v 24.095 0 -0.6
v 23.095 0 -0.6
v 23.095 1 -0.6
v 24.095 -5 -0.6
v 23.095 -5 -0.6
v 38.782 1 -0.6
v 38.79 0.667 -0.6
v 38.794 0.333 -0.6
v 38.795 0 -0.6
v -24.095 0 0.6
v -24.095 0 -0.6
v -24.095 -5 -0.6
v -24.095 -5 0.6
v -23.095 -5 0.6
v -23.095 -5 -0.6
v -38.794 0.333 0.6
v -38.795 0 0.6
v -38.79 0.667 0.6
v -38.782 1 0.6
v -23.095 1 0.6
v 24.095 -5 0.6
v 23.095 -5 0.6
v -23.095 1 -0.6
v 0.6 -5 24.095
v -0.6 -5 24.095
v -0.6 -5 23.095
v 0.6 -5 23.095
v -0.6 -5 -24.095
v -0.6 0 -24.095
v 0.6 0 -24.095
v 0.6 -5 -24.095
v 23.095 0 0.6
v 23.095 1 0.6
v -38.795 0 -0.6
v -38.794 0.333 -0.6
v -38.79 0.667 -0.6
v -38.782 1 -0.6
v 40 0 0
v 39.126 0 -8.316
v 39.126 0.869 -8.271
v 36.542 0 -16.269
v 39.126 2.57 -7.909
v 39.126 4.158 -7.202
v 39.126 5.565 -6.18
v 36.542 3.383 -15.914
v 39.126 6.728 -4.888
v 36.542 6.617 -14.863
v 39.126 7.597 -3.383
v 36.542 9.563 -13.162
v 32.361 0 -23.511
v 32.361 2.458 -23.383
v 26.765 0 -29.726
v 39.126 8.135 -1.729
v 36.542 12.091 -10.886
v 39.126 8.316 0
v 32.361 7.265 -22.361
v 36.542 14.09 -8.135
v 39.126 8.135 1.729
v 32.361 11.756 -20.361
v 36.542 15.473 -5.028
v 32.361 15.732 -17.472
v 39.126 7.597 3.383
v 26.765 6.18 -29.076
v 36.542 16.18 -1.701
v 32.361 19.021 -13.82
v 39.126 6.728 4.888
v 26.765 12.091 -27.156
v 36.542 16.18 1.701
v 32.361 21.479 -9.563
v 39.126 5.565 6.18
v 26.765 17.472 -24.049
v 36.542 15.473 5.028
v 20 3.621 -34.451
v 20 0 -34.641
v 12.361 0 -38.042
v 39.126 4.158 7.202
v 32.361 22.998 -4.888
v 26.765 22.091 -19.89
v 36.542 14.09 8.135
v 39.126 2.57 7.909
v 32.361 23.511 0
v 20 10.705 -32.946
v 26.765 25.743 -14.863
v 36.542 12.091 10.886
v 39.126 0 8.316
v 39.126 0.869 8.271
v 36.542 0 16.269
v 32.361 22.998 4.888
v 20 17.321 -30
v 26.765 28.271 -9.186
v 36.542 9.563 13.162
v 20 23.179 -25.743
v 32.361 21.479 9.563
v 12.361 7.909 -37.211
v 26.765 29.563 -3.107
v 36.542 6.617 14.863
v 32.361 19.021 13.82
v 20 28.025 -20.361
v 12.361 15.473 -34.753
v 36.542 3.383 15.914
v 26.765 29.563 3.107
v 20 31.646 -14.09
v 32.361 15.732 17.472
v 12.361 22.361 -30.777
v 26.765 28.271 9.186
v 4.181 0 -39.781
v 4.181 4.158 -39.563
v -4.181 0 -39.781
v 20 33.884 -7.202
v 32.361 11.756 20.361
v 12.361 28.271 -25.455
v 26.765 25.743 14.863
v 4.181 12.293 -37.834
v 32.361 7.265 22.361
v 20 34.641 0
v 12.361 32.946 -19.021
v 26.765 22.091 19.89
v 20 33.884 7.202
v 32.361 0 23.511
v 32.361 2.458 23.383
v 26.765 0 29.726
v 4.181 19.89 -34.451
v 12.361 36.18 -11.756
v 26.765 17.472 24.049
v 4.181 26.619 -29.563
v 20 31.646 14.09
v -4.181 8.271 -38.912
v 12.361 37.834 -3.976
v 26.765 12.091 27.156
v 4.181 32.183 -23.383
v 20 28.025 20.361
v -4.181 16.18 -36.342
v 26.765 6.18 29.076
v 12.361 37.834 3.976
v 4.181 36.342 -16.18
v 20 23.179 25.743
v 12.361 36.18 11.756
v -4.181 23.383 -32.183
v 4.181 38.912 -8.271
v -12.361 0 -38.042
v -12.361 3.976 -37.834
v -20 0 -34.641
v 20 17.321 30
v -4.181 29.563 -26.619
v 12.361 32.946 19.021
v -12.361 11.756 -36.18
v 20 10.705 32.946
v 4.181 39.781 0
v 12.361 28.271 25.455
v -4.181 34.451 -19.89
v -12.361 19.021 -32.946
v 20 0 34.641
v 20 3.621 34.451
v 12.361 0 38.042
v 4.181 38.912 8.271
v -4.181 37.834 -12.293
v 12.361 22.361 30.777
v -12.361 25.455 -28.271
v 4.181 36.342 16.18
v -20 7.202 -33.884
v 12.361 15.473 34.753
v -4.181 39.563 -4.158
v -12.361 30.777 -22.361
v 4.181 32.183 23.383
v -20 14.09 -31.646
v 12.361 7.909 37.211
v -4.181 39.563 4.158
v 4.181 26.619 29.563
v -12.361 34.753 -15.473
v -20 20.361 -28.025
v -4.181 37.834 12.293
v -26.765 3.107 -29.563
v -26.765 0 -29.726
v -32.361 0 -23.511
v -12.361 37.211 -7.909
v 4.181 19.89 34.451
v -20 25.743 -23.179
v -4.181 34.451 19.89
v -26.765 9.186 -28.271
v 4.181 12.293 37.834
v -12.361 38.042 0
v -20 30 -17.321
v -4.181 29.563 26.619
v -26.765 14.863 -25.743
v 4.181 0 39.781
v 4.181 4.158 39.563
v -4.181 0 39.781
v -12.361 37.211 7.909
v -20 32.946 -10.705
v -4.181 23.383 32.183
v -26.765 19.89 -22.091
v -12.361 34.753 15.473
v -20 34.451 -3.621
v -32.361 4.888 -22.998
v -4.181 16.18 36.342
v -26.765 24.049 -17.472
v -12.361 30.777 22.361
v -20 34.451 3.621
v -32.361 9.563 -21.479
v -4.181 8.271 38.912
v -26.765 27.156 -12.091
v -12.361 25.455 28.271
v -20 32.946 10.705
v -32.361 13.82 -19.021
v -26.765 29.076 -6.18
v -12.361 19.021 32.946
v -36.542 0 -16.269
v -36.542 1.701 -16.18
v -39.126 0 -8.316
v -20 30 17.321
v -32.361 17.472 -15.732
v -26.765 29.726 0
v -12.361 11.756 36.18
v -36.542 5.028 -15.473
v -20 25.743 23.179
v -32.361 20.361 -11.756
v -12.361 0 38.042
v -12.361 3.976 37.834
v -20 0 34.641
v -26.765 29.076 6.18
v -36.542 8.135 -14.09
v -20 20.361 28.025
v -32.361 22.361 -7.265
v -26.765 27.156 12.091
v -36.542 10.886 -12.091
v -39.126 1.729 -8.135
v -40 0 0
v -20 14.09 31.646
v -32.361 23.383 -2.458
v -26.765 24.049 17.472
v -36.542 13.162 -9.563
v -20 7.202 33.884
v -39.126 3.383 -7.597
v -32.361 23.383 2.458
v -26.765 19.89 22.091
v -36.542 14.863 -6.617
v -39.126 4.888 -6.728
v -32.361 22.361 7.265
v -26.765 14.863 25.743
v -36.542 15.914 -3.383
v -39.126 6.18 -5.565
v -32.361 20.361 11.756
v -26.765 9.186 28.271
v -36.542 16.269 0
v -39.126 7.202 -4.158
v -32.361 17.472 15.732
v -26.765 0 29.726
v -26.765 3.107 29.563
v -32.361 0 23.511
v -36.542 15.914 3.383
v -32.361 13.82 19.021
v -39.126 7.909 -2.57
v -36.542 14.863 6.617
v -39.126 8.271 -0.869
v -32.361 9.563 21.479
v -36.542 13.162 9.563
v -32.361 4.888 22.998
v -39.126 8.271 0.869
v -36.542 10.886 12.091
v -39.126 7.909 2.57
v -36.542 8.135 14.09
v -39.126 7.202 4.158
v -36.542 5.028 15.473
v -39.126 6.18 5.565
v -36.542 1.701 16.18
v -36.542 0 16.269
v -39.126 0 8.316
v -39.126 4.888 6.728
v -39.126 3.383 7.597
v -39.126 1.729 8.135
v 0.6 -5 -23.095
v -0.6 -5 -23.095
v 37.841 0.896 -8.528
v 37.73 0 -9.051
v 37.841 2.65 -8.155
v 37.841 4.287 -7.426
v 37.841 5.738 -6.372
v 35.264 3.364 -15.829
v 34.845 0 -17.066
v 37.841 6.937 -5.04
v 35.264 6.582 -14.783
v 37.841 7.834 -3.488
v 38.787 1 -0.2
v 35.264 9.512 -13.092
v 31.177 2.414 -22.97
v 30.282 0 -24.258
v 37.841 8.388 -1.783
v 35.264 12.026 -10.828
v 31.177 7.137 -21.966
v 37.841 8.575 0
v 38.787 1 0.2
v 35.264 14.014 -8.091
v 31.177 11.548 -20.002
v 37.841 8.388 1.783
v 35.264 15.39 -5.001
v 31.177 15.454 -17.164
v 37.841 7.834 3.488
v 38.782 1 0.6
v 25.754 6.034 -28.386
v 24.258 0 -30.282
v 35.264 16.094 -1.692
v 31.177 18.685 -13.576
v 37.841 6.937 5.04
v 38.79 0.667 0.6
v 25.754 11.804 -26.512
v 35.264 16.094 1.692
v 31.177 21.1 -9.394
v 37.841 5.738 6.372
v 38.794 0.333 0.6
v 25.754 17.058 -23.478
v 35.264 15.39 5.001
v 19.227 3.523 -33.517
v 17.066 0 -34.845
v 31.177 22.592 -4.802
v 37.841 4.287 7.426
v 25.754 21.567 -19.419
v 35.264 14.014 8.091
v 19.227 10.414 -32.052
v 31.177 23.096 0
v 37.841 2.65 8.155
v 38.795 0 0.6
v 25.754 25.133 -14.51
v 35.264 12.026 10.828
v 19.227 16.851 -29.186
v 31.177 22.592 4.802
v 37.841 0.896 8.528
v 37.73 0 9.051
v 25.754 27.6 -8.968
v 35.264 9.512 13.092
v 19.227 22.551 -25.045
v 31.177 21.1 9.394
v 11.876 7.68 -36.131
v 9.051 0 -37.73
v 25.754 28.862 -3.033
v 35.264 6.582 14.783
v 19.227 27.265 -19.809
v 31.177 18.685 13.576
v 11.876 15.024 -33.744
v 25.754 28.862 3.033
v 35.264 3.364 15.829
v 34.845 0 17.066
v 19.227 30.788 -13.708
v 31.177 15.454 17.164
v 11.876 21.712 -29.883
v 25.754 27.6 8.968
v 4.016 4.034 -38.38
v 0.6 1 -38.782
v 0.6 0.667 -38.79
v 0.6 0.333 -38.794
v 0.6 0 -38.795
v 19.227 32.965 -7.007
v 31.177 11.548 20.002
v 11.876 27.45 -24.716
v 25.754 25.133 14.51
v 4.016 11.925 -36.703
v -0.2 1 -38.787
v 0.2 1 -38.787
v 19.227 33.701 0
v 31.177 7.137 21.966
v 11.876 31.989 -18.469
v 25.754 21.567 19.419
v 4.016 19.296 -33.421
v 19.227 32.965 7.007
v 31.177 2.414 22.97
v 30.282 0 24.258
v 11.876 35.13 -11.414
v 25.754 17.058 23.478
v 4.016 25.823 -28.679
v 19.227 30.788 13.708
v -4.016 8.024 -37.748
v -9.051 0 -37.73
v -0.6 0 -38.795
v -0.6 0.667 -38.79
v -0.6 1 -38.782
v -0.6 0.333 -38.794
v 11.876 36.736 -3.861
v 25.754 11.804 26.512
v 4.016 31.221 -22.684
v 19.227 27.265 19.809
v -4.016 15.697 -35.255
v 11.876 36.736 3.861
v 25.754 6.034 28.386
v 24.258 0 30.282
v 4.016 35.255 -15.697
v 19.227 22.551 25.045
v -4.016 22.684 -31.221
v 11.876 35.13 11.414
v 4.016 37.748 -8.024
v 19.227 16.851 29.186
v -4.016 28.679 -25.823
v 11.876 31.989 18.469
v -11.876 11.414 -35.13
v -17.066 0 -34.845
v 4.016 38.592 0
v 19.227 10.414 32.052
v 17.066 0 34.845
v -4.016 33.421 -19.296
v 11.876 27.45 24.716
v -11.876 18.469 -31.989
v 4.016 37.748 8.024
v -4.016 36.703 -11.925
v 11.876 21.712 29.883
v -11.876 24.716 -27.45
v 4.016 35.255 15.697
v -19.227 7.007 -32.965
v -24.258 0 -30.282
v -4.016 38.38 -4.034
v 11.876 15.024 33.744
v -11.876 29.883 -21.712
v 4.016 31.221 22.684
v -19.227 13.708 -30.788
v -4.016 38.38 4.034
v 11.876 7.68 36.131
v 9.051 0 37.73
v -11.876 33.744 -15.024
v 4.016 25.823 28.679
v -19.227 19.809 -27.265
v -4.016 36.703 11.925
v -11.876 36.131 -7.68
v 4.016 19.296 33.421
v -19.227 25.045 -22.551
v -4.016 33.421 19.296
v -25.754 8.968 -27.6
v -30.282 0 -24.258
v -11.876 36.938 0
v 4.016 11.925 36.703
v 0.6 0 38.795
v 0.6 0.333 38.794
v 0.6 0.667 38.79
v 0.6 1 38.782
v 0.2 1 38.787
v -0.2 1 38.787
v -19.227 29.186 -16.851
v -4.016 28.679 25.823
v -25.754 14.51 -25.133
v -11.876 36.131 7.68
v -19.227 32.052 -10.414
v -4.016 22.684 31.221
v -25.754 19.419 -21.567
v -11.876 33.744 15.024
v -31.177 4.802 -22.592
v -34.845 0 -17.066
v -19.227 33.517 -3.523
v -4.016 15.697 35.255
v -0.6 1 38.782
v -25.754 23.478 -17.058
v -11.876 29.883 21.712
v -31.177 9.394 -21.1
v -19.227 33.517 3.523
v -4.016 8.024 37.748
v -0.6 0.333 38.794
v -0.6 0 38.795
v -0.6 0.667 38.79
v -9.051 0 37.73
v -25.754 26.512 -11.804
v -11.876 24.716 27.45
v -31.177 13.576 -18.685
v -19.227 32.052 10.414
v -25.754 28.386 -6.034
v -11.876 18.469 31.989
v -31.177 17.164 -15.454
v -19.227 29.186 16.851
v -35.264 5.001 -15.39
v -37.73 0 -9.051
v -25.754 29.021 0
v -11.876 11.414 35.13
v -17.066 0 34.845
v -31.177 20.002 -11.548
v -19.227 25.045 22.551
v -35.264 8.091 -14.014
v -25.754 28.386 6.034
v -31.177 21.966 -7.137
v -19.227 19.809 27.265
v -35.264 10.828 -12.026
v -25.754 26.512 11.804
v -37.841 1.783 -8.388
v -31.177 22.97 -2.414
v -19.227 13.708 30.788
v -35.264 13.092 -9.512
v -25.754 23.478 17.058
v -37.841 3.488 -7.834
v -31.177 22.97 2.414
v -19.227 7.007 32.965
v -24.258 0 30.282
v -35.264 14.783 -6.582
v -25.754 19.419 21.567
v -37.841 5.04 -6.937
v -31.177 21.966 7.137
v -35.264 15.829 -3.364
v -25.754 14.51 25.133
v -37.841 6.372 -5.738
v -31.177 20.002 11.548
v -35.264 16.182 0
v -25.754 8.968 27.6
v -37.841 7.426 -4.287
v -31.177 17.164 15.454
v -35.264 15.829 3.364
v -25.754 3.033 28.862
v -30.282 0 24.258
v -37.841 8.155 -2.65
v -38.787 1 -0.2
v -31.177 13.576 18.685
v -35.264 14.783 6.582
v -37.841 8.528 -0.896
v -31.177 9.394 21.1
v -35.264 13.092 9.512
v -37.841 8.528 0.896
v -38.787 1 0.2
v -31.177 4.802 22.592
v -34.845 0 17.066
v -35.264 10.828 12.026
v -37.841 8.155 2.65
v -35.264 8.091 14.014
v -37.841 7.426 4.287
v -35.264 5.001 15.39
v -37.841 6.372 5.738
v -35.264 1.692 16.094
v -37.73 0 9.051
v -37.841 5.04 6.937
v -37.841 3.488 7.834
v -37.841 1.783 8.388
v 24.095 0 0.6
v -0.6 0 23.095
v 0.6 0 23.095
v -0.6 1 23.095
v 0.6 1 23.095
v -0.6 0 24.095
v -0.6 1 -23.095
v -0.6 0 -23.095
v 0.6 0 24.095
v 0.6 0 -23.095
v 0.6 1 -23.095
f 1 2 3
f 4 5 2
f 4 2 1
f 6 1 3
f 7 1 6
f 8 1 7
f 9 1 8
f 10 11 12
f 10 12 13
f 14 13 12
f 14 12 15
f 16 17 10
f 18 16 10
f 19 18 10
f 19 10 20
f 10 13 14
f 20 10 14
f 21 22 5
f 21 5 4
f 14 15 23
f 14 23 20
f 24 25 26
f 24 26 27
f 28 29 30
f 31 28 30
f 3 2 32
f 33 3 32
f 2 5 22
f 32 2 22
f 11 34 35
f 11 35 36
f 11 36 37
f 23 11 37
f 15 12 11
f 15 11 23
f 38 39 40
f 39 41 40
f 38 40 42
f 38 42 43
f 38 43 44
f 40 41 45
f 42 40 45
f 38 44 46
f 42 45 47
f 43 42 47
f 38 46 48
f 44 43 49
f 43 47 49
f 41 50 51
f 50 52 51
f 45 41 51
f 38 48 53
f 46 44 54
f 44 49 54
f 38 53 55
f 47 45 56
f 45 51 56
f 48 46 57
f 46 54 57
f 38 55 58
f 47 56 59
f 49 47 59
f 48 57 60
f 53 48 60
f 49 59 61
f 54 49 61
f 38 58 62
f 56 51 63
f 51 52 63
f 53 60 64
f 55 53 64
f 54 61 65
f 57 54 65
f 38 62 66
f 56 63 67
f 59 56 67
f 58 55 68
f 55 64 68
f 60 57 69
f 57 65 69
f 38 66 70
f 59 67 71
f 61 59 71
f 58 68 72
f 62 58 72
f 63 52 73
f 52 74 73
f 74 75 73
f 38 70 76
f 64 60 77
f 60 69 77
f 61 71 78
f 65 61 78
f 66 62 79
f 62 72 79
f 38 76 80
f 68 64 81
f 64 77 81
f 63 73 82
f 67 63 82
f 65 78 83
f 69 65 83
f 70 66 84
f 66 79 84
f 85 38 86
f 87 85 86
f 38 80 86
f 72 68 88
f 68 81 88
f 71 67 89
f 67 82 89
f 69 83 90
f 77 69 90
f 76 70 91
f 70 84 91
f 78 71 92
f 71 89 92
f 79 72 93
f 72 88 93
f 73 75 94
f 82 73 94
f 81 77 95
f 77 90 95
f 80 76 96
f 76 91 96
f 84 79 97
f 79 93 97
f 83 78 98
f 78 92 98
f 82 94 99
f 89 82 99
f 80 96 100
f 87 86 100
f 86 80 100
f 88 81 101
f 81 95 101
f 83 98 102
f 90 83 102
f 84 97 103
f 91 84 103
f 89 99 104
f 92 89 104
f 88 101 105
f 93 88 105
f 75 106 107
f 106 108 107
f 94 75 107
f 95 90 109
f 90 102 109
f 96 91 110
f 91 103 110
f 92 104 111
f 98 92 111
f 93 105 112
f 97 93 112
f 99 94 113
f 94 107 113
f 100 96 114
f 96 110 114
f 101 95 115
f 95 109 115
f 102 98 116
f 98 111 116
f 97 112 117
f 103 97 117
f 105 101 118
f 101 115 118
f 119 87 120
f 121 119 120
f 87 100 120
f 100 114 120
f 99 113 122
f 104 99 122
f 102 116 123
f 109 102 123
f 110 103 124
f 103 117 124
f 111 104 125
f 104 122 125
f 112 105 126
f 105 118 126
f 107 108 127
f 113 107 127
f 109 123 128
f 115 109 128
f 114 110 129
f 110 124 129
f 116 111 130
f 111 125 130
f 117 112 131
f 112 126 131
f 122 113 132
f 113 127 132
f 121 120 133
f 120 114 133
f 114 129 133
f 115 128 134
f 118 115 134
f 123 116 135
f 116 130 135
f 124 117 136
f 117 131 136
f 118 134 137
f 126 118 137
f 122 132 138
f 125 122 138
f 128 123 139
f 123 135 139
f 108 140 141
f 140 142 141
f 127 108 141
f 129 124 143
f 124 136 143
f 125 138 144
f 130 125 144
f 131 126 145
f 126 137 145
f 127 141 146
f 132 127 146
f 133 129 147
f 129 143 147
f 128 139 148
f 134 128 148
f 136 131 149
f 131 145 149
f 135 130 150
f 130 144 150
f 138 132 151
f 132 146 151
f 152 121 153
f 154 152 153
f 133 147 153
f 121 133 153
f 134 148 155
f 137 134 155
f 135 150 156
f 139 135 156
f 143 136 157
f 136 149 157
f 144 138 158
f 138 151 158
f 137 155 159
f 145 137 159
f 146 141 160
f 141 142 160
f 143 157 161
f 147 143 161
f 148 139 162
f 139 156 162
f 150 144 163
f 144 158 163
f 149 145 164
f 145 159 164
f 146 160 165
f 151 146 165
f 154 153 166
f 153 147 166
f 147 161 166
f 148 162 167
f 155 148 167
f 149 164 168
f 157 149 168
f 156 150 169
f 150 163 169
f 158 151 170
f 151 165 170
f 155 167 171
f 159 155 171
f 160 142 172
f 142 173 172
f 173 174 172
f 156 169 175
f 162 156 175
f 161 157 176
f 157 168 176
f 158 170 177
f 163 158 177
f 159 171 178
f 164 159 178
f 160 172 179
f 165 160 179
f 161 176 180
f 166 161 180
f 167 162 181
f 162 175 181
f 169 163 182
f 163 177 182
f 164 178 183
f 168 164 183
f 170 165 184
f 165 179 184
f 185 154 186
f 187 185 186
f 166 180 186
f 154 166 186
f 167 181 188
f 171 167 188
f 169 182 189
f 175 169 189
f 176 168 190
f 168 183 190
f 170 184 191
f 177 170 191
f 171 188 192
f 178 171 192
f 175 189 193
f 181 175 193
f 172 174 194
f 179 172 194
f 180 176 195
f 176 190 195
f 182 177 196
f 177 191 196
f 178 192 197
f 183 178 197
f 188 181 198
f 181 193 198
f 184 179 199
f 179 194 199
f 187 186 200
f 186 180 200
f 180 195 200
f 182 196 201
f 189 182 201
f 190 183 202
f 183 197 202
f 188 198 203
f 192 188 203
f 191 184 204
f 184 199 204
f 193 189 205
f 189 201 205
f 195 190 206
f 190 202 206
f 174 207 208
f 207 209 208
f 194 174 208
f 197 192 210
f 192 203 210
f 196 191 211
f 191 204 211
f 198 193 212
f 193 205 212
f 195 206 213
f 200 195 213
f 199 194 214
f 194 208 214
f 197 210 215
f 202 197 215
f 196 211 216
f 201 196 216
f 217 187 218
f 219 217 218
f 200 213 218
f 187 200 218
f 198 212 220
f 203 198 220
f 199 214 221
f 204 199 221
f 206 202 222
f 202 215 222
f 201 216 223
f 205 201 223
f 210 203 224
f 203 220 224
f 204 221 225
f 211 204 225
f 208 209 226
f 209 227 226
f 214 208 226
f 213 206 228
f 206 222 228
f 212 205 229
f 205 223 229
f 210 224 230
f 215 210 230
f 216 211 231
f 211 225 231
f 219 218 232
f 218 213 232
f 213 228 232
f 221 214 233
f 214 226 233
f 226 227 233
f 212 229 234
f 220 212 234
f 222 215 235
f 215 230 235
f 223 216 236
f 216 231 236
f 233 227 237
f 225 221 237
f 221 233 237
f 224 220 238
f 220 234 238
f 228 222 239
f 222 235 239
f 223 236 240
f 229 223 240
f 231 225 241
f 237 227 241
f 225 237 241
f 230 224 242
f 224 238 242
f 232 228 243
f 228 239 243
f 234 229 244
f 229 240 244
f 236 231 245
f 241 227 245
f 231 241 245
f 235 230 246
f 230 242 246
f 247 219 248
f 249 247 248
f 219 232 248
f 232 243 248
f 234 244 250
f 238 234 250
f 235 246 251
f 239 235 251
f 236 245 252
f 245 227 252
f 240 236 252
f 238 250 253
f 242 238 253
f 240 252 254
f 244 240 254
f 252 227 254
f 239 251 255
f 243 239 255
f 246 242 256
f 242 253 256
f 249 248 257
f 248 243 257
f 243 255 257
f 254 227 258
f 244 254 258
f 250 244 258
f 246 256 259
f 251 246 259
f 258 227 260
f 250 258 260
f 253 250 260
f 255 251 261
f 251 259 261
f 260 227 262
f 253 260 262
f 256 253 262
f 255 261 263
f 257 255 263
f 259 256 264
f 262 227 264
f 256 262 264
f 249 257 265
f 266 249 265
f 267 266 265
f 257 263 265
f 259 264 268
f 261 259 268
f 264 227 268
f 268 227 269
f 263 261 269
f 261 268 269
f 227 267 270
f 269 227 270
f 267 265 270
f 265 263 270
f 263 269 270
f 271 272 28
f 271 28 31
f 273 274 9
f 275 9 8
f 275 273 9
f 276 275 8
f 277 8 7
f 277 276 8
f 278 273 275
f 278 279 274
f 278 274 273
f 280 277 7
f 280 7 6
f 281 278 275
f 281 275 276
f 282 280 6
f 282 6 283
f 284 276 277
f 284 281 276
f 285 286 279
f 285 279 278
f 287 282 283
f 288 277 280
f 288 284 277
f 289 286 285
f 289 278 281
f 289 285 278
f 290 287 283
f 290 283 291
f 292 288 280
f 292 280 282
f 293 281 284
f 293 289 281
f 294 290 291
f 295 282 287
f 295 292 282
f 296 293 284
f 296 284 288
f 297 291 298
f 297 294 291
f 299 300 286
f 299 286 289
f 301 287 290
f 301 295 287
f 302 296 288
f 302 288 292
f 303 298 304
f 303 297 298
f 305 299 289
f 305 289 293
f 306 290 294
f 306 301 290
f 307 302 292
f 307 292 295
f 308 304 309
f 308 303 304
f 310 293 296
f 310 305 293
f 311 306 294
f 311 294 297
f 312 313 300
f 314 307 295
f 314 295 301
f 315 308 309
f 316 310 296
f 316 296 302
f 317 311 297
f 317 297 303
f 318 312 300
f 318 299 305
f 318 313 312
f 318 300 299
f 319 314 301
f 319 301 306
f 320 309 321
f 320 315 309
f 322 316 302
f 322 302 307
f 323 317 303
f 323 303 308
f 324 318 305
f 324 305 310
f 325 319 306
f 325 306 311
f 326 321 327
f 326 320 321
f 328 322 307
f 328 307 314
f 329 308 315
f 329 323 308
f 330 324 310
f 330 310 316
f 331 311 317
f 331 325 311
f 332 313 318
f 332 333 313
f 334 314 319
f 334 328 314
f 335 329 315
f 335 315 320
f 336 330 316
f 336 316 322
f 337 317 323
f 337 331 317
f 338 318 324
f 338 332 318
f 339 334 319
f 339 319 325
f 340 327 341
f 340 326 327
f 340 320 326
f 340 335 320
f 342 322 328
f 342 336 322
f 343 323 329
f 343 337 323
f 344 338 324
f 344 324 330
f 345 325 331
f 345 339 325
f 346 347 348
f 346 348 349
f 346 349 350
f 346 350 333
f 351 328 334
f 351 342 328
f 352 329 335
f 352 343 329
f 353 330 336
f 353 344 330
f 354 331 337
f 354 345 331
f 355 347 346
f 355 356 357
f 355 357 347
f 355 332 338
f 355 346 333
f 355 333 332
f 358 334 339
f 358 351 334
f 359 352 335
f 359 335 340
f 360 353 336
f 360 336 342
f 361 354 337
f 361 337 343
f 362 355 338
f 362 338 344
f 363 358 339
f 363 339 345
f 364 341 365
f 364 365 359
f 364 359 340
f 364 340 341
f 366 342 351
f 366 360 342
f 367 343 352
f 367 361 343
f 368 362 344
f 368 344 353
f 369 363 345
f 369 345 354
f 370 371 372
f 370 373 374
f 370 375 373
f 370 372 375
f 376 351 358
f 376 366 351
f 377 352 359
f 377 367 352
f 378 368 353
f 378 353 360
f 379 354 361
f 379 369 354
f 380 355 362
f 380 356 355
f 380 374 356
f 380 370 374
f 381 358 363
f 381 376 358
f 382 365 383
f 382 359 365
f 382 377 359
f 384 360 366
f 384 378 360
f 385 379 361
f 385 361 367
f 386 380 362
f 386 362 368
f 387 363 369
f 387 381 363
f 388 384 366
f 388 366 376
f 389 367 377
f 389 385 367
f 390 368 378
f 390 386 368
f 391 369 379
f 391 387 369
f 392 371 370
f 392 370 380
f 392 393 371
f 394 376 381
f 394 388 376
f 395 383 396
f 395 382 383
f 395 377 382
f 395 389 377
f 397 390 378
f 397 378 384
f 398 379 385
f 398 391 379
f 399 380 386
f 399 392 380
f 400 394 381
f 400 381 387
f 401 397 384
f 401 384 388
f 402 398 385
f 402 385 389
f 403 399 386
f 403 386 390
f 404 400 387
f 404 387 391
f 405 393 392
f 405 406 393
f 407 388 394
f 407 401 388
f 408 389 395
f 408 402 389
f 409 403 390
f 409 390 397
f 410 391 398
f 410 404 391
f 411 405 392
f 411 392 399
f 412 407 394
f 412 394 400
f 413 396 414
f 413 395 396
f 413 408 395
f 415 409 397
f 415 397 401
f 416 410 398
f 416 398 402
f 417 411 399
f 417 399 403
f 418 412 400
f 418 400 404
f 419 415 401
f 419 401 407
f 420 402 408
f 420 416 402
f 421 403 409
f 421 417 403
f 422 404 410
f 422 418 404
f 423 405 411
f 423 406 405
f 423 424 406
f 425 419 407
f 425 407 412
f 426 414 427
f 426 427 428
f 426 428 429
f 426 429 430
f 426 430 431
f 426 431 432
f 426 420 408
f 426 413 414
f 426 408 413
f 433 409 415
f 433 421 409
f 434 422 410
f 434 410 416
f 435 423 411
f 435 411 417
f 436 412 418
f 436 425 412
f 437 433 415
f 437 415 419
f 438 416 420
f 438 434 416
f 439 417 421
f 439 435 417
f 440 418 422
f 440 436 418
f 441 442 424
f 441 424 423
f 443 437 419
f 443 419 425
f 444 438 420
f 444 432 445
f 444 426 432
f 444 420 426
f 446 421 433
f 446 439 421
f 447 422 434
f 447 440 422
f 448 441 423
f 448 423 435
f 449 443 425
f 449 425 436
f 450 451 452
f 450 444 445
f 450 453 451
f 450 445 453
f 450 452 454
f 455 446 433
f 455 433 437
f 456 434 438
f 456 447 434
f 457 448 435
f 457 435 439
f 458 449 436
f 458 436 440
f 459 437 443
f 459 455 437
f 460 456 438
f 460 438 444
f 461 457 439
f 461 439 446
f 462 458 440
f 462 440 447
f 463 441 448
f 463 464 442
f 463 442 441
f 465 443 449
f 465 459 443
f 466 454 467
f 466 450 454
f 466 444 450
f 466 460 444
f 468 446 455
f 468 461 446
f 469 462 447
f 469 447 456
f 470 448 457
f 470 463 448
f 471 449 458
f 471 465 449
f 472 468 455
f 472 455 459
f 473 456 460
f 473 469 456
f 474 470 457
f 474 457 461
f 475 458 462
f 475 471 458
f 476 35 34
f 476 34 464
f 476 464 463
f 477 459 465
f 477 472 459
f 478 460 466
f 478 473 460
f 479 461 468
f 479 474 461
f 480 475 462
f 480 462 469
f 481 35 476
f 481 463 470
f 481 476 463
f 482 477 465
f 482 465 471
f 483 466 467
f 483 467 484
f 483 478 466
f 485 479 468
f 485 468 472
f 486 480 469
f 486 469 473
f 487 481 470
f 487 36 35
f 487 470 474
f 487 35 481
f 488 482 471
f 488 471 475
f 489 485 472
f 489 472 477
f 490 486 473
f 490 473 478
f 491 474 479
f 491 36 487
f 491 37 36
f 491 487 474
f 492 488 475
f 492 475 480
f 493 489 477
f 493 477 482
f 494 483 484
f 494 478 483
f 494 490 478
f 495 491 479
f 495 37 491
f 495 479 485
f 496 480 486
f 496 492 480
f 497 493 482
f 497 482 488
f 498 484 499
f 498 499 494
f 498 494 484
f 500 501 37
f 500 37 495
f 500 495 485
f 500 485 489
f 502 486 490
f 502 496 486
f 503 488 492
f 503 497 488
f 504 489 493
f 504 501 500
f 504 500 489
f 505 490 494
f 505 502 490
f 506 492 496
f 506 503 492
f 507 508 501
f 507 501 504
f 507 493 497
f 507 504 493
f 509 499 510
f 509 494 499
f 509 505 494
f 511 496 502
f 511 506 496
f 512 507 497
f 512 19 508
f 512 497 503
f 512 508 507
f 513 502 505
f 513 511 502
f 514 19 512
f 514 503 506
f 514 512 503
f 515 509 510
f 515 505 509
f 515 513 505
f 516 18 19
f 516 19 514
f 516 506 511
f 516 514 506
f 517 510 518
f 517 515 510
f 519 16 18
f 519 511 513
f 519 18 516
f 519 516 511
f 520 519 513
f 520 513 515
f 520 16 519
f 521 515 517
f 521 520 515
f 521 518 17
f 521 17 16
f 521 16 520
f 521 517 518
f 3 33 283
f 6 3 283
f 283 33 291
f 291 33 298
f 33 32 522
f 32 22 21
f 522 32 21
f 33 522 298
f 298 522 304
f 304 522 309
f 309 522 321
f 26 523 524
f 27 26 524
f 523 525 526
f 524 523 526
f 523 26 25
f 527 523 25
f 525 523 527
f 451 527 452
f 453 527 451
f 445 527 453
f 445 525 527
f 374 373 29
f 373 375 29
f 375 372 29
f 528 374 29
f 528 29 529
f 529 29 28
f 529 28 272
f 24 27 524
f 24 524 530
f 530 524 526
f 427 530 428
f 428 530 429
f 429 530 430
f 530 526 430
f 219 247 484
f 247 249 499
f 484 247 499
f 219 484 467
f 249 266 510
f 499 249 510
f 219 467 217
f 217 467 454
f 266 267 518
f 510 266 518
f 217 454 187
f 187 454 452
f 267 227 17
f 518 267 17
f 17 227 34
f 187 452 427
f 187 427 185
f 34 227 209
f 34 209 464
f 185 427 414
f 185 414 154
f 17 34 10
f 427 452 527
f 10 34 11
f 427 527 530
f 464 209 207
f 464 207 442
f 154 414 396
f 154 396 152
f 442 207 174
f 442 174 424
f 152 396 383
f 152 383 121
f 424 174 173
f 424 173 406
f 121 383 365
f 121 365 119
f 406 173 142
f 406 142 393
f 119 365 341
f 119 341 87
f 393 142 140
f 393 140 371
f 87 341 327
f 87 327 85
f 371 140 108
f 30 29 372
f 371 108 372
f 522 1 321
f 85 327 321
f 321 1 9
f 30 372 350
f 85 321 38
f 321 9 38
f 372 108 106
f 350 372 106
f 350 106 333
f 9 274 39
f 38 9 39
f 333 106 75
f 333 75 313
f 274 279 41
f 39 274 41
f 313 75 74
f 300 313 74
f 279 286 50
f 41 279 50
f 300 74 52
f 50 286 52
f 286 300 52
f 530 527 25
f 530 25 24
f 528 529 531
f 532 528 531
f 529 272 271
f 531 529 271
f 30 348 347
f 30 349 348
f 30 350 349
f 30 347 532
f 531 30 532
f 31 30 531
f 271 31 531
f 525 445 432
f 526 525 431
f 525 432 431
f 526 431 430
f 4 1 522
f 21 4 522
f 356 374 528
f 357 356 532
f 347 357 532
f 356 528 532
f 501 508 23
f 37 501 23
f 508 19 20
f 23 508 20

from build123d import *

# Parameters (mm, degrees)
REVOLVE1_ANGLE      = 180
SHELL2_T            = -1.2
SKETCH4_W           = 16.30613237
SKETCH4_H           = 1.2
SKETCH4_W_2         = 16.004639453
SKETCH4_W_3         = 1.2
SKETCH4_H_2         = 16.004639453
BOSS_EXTRUDE1_DEPTH = 1
SKETCH5_W           = 1.2
SKETCH5_H           = 1
SKETCH5_W_2         = 1
SKETCH5_H_2         = 1.2
BOSS_EXTRUDE2_DEPTH = 5


with BuildPart() as part:
    # Sketch3 → Revolve1 (revolve)
    with BuildSketch(Plane(origin=(0, 0, 0), x_dir=(1, 0, 0), z_dir=(0, 1, 0))):
        with BuildLine():
            Line((-40, 0), (40, 0))
            ThreePointArc((40, 0), (0, 40), (-40, 0))
        make_face()
    revolve(axis=Axis((-40, 0, 0), (1, 0, 0)), revolution_arc=REVOLVE1_ANGLE)

    # Shell2
    shell2_openings = [part.faces().sort_by_distance(p)[0] for p in [
        (0, 0, 0),
    ]]
    offset(amount=SHELL2_T, openings=shell2_openings)

    # Sketch4 → Boss-Extrude1 (add)
    with BuildSketch(Plane.XZ):
        with Locations((-31.248426732, 0)):
            Rectangle(SKETCH4_W, SKETCH4_H)
        with Locations((31.097680274, 0)):
            Rectangle(SKETCH4_W_2, SKETCH4_H)
        with Locations((0, -31.097680274)):
            Rectangle(SKETCH4_W_3, SKETCH4_H_2)
        with Locations((0, 31.097680274)):
            Rectangle(SKETCH4_W_3, SKETCH4_H_2)
    extrude(amount=-BOSS_EXTRUDE1_DEPTH)

    # Sketch5 → Boss-Extrude2 (add)
    with BuildSketch(Plane.XZ):
        with Locations((0, 23.595360547)):
            Rectangle(SKETCH5_W, SKETCH5_H)
        with Locations((-23.595360547, 0)):
            Rectangle(SKETCH5_W_2, SKETCH5_H_2)
        with Locations((23.595360547, 0)):
            Rectangle(SKETCH5_W_2, SKETCH5_H_2)
        with Locations((0, -23.595360547)):
            Rectangle(SKETCH5_W, SKETCH5_H)
    extrude(amount=BOSS_EXTRUDE2_DEPTH)


solid = part.part
